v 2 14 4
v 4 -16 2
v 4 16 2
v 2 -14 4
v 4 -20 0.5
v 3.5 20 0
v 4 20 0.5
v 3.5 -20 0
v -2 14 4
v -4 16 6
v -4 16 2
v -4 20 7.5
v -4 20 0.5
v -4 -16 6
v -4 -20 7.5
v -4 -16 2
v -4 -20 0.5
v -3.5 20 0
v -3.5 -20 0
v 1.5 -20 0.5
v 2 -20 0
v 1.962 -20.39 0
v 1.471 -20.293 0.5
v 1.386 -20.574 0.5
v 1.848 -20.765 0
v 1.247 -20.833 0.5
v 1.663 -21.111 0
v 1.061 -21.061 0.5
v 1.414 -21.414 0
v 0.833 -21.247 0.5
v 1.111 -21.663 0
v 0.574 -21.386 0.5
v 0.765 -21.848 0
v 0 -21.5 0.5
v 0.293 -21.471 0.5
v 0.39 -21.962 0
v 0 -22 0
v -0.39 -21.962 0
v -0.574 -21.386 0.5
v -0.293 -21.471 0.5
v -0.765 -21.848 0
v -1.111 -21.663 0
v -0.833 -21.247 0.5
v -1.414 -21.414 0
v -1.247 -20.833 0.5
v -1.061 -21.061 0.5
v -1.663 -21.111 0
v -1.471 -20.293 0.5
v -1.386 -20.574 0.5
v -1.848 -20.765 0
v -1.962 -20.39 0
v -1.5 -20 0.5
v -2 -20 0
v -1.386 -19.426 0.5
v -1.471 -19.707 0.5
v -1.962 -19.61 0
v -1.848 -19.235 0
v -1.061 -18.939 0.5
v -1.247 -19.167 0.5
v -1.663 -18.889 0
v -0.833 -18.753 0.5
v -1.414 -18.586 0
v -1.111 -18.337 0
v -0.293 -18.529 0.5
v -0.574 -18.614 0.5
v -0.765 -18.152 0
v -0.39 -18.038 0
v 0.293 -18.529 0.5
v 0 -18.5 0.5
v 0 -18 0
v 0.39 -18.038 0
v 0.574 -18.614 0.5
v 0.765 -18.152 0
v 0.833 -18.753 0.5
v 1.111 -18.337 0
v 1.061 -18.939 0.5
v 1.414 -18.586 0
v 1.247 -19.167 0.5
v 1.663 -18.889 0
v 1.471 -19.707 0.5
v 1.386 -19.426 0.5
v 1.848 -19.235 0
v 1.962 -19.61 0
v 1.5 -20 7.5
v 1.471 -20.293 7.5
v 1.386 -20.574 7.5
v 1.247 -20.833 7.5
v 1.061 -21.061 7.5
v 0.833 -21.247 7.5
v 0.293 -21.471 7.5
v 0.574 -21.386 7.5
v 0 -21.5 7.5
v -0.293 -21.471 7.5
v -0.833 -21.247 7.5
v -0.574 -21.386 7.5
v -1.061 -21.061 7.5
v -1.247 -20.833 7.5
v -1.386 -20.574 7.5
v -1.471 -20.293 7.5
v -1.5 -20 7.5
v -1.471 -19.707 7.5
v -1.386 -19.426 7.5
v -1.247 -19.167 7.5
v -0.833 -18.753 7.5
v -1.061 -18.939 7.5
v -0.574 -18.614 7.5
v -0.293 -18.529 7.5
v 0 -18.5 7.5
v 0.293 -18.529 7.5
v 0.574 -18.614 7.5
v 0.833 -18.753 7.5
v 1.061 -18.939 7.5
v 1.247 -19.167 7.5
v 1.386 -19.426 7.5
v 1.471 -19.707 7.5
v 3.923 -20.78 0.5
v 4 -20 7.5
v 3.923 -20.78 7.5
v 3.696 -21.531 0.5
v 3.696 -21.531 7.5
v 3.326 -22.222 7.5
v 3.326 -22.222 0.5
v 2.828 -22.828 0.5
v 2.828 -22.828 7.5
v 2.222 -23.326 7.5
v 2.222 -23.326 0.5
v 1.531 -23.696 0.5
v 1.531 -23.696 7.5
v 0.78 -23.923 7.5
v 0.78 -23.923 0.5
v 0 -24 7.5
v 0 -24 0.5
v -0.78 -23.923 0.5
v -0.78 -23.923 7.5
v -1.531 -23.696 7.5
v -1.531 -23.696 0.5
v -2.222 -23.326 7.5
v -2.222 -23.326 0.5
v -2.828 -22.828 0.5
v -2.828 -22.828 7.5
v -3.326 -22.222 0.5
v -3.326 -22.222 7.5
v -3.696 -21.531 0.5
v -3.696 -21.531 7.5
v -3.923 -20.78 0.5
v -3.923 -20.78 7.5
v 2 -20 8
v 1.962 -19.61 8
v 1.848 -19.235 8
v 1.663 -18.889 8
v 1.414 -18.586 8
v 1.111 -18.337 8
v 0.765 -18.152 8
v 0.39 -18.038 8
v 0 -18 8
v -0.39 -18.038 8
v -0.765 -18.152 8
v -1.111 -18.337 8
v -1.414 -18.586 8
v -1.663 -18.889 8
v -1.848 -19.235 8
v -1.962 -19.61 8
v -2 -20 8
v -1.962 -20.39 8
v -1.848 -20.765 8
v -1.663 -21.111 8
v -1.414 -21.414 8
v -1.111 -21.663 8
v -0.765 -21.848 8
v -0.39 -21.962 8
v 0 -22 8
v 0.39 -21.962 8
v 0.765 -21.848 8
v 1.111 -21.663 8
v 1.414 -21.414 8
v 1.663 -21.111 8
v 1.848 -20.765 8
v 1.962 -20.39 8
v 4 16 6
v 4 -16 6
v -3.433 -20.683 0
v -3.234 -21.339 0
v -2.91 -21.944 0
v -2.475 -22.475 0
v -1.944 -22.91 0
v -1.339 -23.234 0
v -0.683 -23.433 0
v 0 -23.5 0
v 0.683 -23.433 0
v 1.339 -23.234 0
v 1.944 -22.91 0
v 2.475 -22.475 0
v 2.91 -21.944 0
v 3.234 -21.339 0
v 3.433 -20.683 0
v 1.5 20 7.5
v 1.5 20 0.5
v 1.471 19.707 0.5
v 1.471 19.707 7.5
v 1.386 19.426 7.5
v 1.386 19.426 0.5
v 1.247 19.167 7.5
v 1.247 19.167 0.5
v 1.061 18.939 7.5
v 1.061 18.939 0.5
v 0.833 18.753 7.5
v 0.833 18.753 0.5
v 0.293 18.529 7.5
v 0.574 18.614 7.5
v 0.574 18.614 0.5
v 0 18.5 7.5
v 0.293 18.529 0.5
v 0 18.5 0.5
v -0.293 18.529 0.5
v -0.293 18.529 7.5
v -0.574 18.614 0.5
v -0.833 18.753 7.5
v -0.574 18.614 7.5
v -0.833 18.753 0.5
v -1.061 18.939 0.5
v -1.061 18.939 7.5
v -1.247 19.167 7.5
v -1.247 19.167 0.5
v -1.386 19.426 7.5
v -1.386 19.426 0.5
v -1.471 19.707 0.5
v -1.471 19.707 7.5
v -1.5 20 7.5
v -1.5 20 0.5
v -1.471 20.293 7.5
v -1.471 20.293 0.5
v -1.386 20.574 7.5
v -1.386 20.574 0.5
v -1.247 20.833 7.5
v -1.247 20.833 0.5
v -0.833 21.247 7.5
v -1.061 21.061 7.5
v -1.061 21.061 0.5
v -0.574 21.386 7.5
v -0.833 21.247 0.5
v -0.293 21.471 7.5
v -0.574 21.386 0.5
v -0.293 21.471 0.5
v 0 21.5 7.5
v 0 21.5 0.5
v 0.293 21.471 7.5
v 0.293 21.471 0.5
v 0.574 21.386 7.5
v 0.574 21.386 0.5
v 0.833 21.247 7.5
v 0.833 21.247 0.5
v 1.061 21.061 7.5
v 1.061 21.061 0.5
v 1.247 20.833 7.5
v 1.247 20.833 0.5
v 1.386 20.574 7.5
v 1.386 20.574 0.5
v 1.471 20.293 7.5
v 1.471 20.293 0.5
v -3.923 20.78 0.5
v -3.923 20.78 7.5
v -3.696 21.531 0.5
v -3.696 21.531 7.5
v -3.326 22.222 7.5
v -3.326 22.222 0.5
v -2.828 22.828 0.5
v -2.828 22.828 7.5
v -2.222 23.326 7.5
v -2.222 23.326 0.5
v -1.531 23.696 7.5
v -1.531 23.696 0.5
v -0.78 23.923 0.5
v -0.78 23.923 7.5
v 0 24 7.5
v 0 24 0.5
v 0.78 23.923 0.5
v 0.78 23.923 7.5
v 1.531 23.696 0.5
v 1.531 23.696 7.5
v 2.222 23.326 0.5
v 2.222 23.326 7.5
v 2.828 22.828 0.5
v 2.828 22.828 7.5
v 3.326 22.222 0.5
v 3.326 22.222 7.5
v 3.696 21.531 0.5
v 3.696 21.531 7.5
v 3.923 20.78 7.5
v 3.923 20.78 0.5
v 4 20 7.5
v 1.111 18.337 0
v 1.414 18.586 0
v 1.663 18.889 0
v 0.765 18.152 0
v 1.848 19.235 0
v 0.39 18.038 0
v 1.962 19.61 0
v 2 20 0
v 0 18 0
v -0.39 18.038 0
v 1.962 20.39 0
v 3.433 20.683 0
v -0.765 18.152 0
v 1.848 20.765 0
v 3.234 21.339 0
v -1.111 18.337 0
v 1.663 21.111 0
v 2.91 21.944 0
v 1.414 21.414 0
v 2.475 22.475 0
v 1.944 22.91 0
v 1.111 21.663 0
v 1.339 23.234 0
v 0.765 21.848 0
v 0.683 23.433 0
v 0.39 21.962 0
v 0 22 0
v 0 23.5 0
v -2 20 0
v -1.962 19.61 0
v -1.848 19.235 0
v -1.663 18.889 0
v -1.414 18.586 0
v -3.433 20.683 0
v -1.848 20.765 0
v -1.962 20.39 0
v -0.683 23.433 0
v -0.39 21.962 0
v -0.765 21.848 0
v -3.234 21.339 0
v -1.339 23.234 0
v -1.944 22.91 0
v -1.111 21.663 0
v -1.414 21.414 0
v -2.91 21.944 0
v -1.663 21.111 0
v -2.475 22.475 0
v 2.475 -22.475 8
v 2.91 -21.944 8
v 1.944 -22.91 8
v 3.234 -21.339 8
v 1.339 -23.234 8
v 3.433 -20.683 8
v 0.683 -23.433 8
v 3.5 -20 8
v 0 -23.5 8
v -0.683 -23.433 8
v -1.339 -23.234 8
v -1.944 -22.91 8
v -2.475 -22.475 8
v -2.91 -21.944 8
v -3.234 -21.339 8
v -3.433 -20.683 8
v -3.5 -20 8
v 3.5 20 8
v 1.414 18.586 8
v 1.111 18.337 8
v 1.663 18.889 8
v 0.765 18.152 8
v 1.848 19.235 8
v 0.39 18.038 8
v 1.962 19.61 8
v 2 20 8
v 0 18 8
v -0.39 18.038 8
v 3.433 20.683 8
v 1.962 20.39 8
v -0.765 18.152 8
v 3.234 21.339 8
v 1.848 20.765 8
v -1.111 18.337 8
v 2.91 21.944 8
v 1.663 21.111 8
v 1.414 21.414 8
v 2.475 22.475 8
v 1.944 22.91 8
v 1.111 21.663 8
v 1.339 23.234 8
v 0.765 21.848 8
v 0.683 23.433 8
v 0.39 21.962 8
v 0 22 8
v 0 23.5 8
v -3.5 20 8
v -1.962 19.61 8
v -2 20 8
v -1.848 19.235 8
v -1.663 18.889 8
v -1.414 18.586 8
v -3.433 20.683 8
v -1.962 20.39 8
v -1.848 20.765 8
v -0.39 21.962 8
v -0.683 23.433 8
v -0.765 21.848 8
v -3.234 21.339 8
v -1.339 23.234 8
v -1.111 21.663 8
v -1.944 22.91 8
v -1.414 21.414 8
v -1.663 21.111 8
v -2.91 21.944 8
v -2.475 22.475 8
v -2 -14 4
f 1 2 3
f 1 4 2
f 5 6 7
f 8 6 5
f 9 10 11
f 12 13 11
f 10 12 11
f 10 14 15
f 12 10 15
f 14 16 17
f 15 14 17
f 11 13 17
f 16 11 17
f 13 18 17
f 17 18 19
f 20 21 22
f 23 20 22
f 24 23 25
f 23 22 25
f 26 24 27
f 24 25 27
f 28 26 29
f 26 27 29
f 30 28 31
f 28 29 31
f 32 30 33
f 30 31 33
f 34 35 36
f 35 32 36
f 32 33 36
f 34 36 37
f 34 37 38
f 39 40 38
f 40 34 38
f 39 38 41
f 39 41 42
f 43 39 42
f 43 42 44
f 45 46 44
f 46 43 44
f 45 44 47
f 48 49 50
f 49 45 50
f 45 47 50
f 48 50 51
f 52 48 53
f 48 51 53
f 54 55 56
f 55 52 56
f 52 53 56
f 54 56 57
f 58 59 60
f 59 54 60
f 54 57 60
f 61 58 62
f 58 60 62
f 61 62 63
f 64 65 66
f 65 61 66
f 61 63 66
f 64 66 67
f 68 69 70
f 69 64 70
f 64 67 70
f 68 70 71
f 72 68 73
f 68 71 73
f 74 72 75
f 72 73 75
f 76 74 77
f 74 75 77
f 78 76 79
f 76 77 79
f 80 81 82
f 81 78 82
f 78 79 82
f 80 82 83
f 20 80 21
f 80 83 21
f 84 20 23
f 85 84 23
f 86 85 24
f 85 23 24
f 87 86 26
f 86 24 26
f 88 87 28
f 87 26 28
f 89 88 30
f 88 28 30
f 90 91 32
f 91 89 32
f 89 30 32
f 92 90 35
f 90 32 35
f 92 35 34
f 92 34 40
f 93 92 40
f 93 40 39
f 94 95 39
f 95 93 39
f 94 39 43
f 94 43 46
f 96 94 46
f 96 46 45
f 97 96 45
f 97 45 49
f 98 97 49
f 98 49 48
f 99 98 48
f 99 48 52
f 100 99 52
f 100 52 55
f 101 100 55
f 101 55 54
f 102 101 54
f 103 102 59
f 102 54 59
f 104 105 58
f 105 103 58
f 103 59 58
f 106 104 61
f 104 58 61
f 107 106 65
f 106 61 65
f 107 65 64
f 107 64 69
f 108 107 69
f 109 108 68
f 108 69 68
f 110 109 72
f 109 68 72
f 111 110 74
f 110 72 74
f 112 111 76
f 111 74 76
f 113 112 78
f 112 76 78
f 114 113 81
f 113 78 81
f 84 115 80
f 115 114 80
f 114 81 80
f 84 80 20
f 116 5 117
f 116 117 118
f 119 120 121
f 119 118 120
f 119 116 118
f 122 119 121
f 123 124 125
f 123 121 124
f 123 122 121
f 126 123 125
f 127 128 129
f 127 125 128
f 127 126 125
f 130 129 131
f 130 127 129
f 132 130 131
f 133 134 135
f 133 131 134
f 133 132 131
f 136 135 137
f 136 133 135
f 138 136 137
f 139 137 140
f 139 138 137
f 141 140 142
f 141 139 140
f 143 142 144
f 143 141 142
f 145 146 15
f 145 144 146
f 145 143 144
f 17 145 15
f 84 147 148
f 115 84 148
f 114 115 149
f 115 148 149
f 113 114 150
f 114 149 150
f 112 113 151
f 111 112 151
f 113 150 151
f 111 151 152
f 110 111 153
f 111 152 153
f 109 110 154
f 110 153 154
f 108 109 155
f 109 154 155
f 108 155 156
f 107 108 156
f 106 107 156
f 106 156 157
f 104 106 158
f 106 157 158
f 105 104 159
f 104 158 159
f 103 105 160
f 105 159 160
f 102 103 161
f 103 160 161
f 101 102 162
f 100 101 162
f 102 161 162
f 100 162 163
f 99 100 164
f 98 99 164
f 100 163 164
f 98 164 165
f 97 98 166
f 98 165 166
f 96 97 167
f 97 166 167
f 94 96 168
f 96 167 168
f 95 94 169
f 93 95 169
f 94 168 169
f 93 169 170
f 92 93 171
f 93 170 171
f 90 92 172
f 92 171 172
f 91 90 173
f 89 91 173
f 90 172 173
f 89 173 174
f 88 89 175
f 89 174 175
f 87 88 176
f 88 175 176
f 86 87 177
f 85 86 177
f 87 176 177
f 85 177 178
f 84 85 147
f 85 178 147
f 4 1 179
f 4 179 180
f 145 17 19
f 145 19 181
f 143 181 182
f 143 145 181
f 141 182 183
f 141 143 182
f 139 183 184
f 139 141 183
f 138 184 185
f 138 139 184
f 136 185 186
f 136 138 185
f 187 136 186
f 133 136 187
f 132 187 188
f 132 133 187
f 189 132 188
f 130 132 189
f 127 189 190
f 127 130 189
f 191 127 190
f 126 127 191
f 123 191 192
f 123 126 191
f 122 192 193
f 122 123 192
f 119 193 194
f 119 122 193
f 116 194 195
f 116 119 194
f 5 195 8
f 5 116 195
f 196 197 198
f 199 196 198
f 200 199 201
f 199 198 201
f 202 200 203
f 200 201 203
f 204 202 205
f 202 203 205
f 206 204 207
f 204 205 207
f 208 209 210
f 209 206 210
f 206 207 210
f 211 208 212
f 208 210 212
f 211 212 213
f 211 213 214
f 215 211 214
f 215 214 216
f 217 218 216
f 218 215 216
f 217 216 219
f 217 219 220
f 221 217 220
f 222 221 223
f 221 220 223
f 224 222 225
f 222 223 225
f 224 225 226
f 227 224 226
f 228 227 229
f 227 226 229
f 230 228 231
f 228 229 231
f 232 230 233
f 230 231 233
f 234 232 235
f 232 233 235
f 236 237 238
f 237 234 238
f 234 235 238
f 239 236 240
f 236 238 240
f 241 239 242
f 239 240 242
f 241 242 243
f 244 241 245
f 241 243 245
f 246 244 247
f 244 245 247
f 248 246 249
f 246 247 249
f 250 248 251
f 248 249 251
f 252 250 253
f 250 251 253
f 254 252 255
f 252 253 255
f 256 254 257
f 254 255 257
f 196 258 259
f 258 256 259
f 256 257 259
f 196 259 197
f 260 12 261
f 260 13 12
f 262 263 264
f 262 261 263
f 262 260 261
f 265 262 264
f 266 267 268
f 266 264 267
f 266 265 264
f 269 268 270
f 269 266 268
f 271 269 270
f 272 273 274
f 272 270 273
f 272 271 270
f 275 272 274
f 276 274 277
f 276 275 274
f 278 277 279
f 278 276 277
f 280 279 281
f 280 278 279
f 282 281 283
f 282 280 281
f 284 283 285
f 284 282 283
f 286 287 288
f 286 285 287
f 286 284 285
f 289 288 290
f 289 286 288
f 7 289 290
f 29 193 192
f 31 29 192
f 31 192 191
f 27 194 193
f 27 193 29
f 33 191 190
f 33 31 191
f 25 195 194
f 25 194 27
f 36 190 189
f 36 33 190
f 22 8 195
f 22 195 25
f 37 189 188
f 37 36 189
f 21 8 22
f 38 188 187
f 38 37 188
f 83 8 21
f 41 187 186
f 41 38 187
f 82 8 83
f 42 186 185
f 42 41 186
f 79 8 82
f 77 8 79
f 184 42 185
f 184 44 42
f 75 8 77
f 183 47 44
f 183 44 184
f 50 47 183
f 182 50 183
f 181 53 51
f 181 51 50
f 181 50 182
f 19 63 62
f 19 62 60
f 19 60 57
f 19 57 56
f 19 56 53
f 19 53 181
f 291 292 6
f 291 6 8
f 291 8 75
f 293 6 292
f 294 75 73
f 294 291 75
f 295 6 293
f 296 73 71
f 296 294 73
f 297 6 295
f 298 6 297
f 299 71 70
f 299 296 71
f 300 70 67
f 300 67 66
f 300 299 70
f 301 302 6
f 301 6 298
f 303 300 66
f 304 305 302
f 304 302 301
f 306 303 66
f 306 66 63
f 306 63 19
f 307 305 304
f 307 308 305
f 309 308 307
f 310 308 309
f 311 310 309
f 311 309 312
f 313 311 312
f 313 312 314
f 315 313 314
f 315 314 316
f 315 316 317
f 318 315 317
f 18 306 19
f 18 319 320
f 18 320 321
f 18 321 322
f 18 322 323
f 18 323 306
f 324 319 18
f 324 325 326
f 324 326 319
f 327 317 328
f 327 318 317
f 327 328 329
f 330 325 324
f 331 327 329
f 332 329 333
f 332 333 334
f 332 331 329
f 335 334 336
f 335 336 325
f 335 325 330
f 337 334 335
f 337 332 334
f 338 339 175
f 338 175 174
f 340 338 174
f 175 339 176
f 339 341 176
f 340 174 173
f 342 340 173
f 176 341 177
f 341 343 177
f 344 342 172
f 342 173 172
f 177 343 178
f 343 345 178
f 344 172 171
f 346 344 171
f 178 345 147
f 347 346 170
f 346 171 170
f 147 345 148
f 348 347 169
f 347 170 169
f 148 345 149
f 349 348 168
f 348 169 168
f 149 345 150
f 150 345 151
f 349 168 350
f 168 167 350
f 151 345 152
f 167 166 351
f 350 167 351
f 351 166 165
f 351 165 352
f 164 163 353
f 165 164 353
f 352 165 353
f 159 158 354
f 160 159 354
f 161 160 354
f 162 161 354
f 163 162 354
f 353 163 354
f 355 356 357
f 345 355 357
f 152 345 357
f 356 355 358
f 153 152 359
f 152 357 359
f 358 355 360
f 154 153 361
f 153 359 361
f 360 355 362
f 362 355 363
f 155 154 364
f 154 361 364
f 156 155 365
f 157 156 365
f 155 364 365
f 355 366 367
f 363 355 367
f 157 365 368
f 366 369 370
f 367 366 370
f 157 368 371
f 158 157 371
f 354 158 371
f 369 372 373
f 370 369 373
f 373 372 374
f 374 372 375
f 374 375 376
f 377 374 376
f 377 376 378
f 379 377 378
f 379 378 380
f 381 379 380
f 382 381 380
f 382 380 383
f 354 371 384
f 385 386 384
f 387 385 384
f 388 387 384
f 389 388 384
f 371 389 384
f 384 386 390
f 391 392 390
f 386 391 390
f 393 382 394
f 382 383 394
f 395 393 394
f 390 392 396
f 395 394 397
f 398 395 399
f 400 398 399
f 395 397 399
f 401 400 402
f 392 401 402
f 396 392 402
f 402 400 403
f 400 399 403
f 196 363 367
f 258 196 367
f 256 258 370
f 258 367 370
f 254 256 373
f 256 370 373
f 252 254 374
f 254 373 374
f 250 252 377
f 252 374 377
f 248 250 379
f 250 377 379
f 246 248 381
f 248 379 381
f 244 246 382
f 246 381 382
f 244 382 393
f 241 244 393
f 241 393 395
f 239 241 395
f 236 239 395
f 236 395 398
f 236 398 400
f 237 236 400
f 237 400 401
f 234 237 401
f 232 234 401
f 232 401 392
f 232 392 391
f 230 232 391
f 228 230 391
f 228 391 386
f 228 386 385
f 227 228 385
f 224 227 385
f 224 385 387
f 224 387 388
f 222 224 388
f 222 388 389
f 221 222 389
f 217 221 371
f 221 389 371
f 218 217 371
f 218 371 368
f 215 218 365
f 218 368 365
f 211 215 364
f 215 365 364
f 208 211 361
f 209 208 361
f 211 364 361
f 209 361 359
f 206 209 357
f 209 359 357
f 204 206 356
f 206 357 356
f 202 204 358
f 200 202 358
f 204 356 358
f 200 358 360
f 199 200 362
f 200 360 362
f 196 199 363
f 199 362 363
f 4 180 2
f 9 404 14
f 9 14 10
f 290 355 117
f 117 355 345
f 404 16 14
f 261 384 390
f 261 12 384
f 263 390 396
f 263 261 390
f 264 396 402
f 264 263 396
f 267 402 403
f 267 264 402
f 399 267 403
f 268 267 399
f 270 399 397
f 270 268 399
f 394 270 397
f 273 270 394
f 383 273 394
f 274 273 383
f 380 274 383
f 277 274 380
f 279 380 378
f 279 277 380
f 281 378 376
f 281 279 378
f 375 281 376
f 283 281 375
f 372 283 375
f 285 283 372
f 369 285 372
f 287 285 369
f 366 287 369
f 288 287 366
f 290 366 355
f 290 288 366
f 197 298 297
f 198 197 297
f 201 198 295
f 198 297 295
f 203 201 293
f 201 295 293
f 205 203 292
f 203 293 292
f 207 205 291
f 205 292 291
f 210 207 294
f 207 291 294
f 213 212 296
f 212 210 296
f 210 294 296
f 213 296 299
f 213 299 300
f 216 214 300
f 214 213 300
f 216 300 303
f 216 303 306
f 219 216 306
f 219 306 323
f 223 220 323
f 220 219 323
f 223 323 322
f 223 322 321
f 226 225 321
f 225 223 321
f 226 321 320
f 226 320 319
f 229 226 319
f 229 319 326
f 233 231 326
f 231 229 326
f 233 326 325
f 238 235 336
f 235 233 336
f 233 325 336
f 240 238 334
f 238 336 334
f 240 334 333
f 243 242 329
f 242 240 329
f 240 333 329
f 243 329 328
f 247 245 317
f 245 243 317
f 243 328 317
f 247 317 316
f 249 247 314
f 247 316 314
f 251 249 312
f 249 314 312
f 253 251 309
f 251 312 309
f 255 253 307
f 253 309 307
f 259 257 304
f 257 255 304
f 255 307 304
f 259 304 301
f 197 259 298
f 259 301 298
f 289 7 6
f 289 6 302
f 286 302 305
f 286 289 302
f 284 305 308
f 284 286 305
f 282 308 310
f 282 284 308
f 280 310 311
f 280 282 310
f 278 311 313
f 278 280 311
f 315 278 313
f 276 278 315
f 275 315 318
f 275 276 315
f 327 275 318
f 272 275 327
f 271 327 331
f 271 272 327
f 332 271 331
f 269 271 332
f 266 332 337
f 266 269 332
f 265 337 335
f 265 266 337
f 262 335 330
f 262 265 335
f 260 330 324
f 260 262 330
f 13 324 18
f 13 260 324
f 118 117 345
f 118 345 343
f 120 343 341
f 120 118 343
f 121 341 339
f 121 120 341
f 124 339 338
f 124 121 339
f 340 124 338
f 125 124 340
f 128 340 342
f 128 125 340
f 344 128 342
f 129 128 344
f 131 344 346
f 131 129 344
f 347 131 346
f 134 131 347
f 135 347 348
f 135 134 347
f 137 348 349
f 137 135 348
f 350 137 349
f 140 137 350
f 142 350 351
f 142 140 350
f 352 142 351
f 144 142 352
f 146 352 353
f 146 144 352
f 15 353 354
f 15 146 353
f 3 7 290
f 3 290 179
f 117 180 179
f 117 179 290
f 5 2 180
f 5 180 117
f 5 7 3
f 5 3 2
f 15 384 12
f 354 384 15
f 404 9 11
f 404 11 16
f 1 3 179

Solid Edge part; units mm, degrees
sketch "Sketch1" plane through (0, 0, 0) normal (0, 0, 1) x (1, 0, 0)
  line L0 (4, 20) -> (4, -20)
  line L1 (-4, 20) -> (-4, -20)
  arc A0 (4, -20) -> (-4, -20) centre (0, -20) cw
  arc A1 (-4, 20) -> (4, 20) centre (0, 20) cw
  circle A2 centre (0, -20) radius 1.5
  circle A3 centre (0, 20) radius 1.5
extrude "Protrusion1" add sketch "Sketch1" along normal blind 8
sketch "Sketch2" plane through (4, 0, 4) normal (1, 0, 0) x (0, 1, 0)
  line L0 (16, 2) -> (-16, 2)
  line L1 (-16, 2) -> (-16, -2)
  line L2 (-16, -2) -> (16, -2)
  line L3 (16, -2) -> (16, 2)
  dimension "D1" = 2
  dimension "D2" = 2
  dimension "D3" = 4
  dimension "D4" = 4
extrude "VaciadoExtruido_1" cut sketch "Sketch2" against normal blind 2
chamfer "Chaflán_1" distance 2 angle 45 4 edges at (2, 0, 2) (2, 16, 4) (2, 0, 6) (2, -16, 4)
mirror "Mirror1" about plane through (0, 0, 0) normal (1, 0, 0) of "VaciadoExtruido_1"
chamfer "Chamfer1" distance 2 angle 45 4 edges at (-2, 0, 2) (-2, 16, 4) (-2, 0, 6) (-2, -16, 4)
chamfer "Chaflán_3" distance 0.5 angle 45 10 edges at (-4, 0, 8) (0, 24, 8) (4, 0, 8) (-4, 0, 0) (0, 24, 0) (4, 0, 0) (-1.5, -20, 8) (-1.5, 20, 8) (-1.5, 20, 0) (-1.5, -20, 0)
